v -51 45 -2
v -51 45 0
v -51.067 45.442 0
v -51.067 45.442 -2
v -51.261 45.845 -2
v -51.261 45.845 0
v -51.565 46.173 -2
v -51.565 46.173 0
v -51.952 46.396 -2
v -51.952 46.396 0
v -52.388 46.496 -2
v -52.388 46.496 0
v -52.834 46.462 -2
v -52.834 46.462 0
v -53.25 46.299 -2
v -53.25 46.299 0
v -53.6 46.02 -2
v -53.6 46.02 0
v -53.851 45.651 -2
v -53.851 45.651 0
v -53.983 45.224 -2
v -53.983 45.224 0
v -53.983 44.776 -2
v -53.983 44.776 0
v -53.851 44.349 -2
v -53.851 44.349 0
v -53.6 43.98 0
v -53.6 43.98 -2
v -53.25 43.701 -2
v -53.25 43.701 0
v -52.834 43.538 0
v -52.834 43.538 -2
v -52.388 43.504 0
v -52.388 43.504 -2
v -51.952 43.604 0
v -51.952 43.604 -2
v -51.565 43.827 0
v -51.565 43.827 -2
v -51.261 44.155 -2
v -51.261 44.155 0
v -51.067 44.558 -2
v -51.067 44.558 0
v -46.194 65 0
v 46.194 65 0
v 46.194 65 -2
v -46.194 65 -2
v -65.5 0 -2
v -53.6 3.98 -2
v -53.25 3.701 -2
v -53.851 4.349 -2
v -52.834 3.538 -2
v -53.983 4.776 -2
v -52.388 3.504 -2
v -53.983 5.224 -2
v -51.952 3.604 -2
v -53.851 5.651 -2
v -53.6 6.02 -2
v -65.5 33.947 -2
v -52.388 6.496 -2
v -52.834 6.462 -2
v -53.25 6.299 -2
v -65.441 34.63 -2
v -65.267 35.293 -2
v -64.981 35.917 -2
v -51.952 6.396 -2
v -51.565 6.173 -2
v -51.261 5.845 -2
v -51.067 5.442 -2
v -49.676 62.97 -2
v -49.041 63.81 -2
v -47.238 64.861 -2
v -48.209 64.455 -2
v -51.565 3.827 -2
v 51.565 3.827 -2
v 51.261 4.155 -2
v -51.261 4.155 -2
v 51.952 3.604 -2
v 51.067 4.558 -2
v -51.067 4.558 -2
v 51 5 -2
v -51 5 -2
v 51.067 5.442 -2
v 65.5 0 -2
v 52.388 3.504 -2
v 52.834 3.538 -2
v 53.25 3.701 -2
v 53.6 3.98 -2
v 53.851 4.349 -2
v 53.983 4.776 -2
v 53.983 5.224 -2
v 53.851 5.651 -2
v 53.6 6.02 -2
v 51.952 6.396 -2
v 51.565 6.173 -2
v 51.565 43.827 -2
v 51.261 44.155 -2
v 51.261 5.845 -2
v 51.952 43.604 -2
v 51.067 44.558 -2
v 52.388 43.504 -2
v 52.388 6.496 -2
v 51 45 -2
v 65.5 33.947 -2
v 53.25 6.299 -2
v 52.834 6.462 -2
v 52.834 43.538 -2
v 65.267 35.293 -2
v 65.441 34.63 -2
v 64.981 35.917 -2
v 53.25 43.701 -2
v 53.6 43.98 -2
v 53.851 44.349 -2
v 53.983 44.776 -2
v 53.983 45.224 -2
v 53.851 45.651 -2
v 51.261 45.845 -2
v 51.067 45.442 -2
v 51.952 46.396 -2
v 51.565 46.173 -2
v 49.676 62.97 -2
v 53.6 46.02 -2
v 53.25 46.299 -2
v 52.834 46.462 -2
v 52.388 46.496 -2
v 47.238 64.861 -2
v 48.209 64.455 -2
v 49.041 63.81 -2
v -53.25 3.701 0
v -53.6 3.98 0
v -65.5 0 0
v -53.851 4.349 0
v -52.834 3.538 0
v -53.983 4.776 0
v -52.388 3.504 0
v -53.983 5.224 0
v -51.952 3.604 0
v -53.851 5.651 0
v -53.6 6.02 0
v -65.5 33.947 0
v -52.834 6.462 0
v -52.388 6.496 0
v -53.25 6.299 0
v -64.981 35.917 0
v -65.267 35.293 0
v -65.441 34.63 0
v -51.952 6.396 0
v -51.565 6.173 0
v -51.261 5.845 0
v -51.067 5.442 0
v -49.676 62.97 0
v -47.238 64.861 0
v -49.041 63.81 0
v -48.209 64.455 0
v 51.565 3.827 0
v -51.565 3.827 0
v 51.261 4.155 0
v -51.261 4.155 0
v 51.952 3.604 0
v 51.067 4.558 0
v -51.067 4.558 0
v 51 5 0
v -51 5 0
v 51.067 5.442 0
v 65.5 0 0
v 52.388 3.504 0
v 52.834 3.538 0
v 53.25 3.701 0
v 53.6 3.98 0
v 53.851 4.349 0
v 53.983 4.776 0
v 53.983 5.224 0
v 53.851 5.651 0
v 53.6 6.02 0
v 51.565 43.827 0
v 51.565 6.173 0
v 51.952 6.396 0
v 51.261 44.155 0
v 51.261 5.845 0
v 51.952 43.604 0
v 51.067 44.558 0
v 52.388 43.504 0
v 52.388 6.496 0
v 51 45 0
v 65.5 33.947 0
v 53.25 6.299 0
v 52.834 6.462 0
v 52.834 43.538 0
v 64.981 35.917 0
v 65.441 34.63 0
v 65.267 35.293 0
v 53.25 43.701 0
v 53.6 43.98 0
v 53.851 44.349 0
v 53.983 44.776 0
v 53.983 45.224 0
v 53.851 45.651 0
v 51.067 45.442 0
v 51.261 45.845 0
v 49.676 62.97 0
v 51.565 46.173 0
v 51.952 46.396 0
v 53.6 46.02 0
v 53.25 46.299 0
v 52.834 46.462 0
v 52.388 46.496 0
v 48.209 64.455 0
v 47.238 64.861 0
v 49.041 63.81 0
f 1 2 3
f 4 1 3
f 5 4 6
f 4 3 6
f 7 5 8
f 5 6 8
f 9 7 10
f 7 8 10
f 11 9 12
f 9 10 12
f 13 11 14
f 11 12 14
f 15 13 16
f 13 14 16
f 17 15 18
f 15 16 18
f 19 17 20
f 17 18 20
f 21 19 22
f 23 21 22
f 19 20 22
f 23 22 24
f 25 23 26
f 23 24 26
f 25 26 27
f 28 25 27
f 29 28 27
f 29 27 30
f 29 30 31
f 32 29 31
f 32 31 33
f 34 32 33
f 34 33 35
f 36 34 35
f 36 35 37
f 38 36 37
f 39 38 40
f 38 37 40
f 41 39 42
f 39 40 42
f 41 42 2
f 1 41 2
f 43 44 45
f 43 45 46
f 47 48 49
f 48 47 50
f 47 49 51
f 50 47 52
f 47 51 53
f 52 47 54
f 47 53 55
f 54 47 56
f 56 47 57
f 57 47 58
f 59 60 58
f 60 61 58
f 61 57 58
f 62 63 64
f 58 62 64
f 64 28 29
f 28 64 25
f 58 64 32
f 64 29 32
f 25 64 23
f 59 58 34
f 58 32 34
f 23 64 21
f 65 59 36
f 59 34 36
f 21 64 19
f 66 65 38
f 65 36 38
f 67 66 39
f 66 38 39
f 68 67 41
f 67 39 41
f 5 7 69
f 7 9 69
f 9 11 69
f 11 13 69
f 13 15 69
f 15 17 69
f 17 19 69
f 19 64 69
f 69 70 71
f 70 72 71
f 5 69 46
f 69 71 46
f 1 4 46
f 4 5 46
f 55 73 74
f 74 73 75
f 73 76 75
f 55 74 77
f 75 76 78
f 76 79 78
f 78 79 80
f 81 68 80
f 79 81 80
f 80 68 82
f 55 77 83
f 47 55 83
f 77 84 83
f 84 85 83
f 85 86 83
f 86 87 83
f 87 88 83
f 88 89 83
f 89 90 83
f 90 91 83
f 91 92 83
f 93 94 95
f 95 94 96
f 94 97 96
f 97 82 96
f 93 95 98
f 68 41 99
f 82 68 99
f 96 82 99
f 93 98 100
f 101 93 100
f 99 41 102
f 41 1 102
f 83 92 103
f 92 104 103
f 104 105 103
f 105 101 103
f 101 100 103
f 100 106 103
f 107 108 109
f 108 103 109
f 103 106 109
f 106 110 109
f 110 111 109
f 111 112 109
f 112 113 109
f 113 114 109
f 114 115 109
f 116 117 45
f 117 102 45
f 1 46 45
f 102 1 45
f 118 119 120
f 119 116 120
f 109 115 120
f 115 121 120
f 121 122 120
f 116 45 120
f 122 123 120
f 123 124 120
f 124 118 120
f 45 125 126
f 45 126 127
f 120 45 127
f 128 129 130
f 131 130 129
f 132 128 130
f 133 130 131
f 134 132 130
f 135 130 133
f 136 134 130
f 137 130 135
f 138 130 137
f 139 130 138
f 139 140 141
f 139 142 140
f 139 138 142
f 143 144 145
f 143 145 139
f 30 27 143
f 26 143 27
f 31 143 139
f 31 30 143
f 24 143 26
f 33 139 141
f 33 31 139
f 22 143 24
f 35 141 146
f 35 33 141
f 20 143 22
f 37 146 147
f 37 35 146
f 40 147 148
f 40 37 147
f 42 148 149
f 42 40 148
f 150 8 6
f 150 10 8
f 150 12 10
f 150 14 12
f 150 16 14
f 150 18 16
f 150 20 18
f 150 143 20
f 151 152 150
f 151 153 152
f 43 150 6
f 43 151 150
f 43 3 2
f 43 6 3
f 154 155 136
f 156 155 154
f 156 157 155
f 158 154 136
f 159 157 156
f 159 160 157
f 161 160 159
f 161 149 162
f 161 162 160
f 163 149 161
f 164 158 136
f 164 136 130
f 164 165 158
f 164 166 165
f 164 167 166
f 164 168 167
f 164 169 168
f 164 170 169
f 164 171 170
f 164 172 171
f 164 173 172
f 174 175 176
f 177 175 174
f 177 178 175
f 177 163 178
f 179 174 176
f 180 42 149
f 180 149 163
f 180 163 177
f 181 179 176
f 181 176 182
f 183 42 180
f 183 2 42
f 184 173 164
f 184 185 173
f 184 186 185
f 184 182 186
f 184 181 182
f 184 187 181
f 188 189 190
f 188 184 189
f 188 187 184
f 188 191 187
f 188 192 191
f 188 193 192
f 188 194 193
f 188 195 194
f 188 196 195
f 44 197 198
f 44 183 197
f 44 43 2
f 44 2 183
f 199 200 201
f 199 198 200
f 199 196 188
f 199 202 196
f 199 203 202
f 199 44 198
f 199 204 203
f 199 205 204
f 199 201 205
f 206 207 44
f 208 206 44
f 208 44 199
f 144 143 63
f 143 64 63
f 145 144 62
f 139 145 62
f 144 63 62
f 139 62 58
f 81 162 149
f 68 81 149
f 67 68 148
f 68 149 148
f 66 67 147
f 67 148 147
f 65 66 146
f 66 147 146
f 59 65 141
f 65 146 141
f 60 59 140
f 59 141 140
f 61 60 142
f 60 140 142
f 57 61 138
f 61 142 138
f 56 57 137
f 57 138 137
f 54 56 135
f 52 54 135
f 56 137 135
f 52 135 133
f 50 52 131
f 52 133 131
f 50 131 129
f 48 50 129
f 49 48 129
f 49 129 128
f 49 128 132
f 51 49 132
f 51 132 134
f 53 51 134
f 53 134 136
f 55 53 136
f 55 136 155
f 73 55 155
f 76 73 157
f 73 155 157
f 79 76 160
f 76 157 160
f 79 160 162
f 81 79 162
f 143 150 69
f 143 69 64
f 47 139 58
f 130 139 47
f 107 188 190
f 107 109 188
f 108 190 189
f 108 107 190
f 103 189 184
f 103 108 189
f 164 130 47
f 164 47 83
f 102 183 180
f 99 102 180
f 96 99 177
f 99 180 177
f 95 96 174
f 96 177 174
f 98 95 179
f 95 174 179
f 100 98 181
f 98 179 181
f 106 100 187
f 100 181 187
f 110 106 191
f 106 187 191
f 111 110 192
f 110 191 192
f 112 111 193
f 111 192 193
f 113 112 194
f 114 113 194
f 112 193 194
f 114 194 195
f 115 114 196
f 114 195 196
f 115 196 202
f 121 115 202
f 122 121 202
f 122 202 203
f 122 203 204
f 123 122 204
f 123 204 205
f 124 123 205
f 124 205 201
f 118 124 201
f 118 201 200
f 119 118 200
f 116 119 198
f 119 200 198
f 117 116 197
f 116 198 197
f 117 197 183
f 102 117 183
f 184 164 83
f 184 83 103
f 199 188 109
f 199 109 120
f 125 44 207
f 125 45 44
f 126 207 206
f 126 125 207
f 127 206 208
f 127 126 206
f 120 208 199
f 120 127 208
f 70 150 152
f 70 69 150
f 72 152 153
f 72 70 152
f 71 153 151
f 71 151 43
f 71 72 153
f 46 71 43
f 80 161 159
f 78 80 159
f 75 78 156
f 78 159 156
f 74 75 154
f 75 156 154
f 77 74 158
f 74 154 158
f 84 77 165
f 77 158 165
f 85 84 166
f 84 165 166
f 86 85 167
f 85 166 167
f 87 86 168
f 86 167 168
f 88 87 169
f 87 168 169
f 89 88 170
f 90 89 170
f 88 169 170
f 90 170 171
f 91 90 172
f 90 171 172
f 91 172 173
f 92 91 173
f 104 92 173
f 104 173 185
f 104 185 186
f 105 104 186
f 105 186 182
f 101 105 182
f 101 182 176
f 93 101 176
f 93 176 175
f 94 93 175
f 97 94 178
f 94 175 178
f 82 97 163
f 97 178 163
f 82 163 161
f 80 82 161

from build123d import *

# Parameters (mm, degrees)
ESQUISSE1_R               = 1.5
T_LE_DE_BASE_PLI_E1_DEPTH = 2
CONG_1_R                  = 4


# Sheet-metal steps are written as plain solids
with BuildPart() as part:
    # Esquisse1 → Tôle de base pliée1 (new body)
    with BuildSketch(Plane.XY):
        Polygon((-48.526816654, 65), (-65.5, 35), (-65.5, 0), (65.5, 0), (65.5, 35), (48.526816654, 65), align=None)
        with Locations((-52.5, 45)):
            Circle(ESQUISSE1_R, mode=Mode.SUBTRACT)
        with Locations((-52.5, 5)):
            Circle(ESQUISSE1_R, mode=Mode.SUBTRACT)
        with Locations(Location((52.5, 5, 0), (0, 0, 180))):
            Circle(ESQUISSE1_R, mode=Mode.SUBTRACT)
        with Locations(Location((52.5, 45, 0), (0, 0, 180))):
            Circle(ESQUISSE1_R, mode=Mode.SUBTRACT)
    extrude(amount=-T_LE_DE_BASE_PLI_E1_DEPTH)

    # Congé1
    cong_1_edges = [part.edges().sort_by_distance(p)[0] for p in [
        (-65.5, 35, -1),
        (-48.526816654, 65, -1),
        (48.526816654, 65, -1),
        (65.5, 35, -1),
    ]]
    fillet(cong_1_edges, radius=CONG_1_R)


solid = part.part
